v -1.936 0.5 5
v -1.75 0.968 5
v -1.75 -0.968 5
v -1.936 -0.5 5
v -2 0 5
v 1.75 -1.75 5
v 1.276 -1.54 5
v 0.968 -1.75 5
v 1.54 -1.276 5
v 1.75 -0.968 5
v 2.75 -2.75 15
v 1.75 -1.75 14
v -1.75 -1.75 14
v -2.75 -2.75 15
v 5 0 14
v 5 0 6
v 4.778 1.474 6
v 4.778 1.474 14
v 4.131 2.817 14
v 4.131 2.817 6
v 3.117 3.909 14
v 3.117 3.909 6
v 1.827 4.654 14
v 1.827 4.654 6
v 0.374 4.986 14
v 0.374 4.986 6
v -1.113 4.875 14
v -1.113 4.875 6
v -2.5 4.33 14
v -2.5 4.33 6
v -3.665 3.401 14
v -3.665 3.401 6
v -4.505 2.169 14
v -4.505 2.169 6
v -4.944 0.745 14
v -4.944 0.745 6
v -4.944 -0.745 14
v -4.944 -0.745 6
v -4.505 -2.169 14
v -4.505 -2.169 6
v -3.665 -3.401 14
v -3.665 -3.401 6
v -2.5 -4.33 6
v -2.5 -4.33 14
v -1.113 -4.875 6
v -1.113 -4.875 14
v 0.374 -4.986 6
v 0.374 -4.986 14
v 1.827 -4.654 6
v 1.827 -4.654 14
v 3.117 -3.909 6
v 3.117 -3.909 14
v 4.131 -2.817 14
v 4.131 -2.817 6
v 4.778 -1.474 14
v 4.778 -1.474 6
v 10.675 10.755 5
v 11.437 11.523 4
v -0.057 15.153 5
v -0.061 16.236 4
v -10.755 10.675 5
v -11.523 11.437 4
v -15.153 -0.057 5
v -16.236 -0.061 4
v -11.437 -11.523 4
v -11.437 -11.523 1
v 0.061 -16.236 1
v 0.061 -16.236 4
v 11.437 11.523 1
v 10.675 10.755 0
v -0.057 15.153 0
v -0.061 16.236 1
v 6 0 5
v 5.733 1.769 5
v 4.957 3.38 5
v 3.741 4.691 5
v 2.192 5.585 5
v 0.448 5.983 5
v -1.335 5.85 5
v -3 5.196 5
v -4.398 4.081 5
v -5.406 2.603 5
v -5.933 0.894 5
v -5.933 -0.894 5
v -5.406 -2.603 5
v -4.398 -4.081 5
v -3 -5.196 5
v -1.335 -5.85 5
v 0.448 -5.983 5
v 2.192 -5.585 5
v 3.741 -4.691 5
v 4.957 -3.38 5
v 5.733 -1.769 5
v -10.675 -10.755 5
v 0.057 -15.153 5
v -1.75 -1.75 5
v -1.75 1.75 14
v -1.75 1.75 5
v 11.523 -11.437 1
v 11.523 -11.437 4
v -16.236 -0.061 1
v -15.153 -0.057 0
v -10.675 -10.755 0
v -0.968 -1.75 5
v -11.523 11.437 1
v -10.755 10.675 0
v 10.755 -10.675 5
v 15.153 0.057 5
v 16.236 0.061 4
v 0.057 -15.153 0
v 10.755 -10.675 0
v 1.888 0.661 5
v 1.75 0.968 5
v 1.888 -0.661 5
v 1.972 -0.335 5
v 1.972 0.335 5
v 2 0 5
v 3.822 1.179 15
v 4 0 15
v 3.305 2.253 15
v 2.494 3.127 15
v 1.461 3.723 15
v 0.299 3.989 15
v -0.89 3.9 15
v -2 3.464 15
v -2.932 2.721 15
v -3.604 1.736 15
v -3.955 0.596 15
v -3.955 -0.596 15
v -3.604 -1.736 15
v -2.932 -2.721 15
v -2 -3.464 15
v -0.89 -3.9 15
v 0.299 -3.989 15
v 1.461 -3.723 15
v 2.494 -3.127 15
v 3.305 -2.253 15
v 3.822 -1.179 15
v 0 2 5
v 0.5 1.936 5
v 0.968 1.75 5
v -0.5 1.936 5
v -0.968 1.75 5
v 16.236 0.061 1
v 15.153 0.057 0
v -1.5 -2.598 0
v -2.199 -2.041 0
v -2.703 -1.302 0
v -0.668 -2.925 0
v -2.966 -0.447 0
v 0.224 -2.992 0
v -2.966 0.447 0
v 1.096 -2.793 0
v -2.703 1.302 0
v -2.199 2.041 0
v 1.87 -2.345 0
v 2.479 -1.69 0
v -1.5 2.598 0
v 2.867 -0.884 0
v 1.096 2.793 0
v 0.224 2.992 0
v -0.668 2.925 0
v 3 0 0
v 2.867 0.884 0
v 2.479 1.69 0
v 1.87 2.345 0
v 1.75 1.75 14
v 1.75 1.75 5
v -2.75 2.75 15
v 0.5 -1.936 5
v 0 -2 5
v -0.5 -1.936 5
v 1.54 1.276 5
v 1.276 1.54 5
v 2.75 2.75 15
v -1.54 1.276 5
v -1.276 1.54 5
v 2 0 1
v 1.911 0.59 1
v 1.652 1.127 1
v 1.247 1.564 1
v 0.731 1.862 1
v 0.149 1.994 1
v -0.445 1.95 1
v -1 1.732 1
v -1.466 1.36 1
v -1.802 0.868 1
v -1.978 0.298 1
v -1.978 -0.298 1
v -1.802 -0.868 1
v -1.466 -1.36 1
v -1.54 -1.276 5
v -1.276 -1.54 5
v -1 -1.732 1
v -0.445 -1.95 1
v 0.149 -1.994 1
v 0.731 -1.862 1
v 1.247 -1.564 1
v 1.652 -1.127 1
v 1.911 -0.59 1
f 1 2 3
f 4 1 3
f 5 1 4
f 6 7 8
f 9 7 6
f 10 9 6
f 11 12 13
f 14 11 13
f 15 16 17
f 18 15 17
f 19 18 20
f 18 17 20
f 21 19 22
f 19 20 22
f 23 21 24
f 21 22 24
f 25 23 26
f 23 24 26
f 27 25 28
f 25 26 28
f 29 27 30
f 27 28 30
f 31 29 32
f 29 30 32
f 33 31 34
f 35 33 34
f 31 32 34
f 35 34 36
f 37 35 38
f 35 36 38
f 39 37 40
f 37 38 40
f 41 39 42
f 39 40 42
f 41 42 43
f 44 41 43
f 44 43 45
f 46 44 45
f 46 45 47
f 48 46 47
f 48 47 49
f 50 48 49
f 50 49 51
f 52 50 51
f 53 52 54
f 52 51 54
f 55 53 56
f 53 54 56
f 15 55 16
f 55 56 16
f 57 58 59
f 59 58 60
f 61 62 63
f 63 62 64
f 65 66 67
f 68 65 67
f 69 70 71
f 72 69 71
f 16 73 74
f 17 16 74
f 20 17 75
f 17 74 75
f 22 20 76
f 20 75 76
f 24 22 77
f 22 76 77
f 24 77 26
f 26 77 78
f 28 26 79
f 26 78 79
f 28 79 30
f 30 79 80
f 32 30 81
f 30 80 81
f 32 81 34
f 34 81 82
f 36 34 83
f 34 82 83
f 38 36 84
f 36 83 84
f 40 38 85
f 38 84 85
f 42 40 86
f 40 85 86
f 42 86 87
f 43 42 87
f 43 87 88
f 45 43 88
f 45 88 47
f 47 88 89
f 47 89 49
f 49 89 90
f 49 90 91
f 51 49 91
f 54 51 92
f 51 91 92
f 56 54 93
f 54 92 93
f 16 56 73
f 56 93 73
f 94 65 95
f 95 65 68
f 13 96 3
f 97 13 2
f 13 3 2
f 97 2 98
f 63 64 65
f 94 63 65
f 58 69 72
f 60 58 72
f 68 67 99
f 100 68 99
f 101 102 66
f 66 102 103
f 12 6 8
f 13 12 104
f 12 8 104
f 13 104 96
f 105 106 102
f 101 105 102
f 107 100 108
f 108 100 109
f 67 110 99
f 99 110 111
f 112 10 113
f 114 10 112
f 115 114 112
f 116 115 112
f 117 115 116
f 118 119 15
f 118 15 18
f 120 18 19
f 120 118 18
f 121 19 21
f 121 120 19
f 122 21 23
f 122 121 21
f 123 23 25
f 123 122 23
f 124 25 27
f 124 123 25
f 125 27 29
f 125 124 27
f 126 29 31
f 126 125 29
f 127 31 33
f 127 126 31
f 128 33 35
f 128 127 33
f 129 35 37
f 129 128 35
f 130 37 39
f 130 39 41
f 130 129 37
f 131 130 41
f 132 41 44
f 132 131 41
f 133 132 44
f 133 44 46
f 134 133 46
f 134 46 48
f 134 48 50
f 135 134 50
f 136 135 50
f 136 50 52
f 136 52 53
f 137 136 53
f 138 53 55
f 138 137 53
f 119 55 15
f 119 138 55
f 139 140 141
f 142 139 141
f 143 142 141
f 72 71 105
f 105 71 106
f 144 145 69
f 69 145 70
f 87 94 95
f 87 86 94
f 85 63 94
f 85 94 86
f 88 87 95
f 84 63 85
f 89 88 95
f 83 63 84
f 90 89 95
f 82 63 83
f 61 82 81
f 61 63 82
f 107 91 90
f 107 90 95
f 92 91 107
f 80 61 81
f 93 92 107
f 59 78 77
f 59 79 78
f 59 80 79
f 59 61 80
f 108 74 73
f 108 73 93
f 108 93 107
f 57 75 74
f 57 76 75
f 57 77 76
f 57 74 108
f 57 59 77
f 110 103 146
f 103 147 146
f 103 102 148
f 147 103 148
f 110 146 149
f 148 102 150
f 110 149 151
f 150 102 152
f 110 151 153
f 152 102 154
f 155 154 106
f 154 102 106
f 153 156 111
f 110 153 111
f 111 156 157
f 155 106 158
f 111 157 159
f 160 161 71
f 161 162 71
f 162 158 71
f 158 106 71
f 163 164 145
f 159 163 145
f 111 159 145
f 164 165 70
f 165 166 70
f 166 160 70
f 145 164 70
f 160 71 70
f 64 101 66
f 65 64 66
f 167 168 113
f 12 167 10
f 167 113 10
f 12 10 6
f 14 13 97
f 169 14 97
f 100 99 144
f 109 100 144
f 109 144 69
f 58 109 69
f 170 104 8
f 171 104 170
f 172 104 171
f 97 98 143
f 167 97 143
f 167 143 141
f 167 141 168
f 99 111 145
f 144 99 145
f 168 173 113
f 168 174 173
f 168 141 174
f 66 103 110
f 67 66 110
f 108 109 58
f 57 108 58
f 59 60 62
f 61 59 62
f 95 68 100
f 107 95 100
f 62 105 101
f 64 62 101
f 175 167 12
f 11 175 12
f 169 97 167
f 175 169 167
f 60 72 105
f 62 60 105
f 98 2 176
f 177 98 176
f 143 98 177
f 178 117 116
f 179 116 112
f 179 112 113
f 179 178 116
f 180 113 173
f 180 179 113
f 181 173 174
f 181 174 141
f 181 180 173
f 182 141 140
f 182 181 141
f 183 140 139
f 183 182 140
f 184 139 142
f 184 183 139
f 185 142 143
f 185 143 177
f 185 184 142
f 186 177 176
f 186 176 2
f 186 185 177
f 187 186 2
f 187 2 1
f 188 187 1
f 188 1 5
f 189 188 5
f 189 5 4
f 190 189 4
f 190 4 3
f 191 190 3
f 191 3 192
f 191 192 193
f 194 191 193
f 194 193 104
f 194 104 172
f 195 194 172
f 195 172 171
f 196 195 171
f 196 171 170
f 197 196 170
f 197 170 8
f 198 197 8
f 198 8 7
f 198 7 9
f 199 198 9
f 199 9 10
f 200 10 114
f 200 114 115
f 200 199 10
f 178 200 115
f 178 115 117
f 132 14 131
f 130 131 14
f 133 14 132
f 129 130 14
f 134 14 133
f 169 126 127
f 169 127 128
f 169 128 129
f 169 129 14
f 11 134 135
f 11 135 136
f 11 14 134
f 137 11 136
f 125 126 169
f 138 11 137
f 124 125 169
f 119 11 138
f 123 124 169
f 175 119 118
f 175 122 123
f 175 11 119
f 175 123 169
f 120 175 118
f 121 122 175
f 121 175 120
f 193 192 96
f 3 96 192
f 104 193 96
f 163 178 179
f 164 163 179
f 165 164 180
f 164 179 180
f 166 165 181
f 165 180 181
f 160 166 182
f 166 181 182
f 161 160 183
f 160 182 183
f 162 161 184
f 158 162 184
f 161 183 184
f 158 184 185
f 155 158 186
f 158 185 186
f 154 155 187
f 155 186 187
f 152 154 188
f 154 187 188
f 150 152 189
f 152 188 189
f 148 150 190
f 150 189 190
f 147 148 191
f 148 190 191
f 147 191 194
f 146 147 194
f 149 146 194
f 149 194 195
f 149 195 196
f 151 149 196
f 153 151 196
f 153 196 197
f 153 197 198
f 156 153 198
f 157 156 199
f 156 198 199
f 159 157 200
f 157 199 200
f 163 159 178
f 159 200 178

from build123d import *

# Parameters (mm, degrees)
F0_R     = 2
F1_DEPTH = 5
F2_R     = 5
F3_DEPTH = 10
F4_SIZE  = 1


with BuildPart() as f1:
    # F0 (on Top) → F1 (new body)
    with BuildSketch(Plane.XY):
        Polygon((16.2357693204, 0.0607577779), (11.4374603474, 11.523384821), (-0.0607577779, 16.2357693204), (-11.523384821, 11.4374603474), (-16.2357693204, -0.0607577779), (-11.4374603474, -11.523384821), (0.0607577779, -16.2357693204), (11.523384821, -11.4374603474), align=None)
        Circle(F0_R, mode=Mode.SUBTRACT)
    extrude(amount=F1_DEPTH)

    # F2 (on face) → F3 (join)
    with BuildSketch(Plane.XY.offset(5)):
        Circle(F2_R)
        with BuildLine():
            Line((0.9682458366, 1.75), (1.75, 1.75))
            Line((1.75, 1.75), (1.75, 0.9682458366))
            ThreePointArc((1.75, 0.9682458366), (1.9364916731, 0.5), (2, 0))
            ThreePointArc((2, 0), (1.9364916731, -0.5), (1.75, -0.9682458366))
            Line((1.75, -0.9682458366), (1.75, -1.75))
            Line((1.75, -1.75), (0.9682458366, -1.75))
            ThreePointArc((0.9682458366, -1.75), (0, -2), (-0.9682458366, -1.75))
            Line((-0.9682458366, -1.75), (-1.75, -1.75))
            Line((-1.75, -1.75), (-1.75, -0.9682458366))
            ThreePointArc((-1.75, -0.9682458366), (-2, 0), (-1.75, 0.9682458366))
            Line((-1.75, 0.9682458366), (-1.75, 1.75))
            Line((-1.75, 1.75), (-0.9682458366, 1.75))
            ThreePointArc((-0.9682458366, 1.75), (0, 2), (0.9682458366, 1.75))
        make_face(mode=Mode.SUBTRACT)
        with BuildLine():
            Line((-0.9682458366, 1.75), (0.9682458366, 1.75))
            ThreePointArc((0.9682458366, 1.75), (0, 2), (-0.9682458366, 1.75))
        make_face()
        with BuildLine():
            ThreePointArc((2, 0), (1.9364916731, 0.5), (1.75, 0.9682458366))
            Line((1.75, 0.9682458366), (1.75, -0.9682458366))
            ThreePointArc((1.75, -0.9682458366), (1.9364916731, -0.5), (2, 0))
        make_face()
        with BuildLine():
            ThreePointArc((-0.9682458366, -1.75), (0, -2), (0.9682458366, -1.75))
            Line((0.9682458366, -1.75), (-0.9682458366, -1.75))
        make_face()
        with BuildLine():
            Line((-1.75, -0.9682458366), (-1.75, 0.9682458366))
            ThreePointArc((-1.75, 0.9682458366), (-2, 0), (-1.75, -0.9682458366))
        make_face()
    extrude(amount=F3_DEPTH)

    # F4
    f4_edges = [f1.edges().sort_by_distance(p)[0] for p in [
        (-5, 0, 15),
        (0, 1.75, 15),
        (1.75, 0, 15),
        (0, -1.75, 15),
        (-1.75, 0, 15),
        (-5, 0, 5),
        (13.879577, -5.688351, 5),
        (13.836615, 5.792071, 5),
        (5.792071, -13.836615, 5),
        (-5.688351, -13.879577, 5),
        (5.688351, 13.879577, 5),
        (-13.836615, -5.792071, 5),
        (-5.792071, 13.836615, 5),
        (-13.879577, 5.688351, 5),
        (13.879577, -5.688351, 0),
        (13.836615, 5.792071, 0),
        (5.688351, 13.879577, 0),
        (-5.792071, 13.836615, 0),
        (-13.879577, 5.688351, 0),
        (-13.836615, -5.792071, 0),
        (-5.688351, -13.879577, 0),
        (5.792071, -13.836615, 0),
        (-2, 0, 0),
    ]]
    chamfer(f4_edges, length=F4_SIZE)


solid = f1.part
